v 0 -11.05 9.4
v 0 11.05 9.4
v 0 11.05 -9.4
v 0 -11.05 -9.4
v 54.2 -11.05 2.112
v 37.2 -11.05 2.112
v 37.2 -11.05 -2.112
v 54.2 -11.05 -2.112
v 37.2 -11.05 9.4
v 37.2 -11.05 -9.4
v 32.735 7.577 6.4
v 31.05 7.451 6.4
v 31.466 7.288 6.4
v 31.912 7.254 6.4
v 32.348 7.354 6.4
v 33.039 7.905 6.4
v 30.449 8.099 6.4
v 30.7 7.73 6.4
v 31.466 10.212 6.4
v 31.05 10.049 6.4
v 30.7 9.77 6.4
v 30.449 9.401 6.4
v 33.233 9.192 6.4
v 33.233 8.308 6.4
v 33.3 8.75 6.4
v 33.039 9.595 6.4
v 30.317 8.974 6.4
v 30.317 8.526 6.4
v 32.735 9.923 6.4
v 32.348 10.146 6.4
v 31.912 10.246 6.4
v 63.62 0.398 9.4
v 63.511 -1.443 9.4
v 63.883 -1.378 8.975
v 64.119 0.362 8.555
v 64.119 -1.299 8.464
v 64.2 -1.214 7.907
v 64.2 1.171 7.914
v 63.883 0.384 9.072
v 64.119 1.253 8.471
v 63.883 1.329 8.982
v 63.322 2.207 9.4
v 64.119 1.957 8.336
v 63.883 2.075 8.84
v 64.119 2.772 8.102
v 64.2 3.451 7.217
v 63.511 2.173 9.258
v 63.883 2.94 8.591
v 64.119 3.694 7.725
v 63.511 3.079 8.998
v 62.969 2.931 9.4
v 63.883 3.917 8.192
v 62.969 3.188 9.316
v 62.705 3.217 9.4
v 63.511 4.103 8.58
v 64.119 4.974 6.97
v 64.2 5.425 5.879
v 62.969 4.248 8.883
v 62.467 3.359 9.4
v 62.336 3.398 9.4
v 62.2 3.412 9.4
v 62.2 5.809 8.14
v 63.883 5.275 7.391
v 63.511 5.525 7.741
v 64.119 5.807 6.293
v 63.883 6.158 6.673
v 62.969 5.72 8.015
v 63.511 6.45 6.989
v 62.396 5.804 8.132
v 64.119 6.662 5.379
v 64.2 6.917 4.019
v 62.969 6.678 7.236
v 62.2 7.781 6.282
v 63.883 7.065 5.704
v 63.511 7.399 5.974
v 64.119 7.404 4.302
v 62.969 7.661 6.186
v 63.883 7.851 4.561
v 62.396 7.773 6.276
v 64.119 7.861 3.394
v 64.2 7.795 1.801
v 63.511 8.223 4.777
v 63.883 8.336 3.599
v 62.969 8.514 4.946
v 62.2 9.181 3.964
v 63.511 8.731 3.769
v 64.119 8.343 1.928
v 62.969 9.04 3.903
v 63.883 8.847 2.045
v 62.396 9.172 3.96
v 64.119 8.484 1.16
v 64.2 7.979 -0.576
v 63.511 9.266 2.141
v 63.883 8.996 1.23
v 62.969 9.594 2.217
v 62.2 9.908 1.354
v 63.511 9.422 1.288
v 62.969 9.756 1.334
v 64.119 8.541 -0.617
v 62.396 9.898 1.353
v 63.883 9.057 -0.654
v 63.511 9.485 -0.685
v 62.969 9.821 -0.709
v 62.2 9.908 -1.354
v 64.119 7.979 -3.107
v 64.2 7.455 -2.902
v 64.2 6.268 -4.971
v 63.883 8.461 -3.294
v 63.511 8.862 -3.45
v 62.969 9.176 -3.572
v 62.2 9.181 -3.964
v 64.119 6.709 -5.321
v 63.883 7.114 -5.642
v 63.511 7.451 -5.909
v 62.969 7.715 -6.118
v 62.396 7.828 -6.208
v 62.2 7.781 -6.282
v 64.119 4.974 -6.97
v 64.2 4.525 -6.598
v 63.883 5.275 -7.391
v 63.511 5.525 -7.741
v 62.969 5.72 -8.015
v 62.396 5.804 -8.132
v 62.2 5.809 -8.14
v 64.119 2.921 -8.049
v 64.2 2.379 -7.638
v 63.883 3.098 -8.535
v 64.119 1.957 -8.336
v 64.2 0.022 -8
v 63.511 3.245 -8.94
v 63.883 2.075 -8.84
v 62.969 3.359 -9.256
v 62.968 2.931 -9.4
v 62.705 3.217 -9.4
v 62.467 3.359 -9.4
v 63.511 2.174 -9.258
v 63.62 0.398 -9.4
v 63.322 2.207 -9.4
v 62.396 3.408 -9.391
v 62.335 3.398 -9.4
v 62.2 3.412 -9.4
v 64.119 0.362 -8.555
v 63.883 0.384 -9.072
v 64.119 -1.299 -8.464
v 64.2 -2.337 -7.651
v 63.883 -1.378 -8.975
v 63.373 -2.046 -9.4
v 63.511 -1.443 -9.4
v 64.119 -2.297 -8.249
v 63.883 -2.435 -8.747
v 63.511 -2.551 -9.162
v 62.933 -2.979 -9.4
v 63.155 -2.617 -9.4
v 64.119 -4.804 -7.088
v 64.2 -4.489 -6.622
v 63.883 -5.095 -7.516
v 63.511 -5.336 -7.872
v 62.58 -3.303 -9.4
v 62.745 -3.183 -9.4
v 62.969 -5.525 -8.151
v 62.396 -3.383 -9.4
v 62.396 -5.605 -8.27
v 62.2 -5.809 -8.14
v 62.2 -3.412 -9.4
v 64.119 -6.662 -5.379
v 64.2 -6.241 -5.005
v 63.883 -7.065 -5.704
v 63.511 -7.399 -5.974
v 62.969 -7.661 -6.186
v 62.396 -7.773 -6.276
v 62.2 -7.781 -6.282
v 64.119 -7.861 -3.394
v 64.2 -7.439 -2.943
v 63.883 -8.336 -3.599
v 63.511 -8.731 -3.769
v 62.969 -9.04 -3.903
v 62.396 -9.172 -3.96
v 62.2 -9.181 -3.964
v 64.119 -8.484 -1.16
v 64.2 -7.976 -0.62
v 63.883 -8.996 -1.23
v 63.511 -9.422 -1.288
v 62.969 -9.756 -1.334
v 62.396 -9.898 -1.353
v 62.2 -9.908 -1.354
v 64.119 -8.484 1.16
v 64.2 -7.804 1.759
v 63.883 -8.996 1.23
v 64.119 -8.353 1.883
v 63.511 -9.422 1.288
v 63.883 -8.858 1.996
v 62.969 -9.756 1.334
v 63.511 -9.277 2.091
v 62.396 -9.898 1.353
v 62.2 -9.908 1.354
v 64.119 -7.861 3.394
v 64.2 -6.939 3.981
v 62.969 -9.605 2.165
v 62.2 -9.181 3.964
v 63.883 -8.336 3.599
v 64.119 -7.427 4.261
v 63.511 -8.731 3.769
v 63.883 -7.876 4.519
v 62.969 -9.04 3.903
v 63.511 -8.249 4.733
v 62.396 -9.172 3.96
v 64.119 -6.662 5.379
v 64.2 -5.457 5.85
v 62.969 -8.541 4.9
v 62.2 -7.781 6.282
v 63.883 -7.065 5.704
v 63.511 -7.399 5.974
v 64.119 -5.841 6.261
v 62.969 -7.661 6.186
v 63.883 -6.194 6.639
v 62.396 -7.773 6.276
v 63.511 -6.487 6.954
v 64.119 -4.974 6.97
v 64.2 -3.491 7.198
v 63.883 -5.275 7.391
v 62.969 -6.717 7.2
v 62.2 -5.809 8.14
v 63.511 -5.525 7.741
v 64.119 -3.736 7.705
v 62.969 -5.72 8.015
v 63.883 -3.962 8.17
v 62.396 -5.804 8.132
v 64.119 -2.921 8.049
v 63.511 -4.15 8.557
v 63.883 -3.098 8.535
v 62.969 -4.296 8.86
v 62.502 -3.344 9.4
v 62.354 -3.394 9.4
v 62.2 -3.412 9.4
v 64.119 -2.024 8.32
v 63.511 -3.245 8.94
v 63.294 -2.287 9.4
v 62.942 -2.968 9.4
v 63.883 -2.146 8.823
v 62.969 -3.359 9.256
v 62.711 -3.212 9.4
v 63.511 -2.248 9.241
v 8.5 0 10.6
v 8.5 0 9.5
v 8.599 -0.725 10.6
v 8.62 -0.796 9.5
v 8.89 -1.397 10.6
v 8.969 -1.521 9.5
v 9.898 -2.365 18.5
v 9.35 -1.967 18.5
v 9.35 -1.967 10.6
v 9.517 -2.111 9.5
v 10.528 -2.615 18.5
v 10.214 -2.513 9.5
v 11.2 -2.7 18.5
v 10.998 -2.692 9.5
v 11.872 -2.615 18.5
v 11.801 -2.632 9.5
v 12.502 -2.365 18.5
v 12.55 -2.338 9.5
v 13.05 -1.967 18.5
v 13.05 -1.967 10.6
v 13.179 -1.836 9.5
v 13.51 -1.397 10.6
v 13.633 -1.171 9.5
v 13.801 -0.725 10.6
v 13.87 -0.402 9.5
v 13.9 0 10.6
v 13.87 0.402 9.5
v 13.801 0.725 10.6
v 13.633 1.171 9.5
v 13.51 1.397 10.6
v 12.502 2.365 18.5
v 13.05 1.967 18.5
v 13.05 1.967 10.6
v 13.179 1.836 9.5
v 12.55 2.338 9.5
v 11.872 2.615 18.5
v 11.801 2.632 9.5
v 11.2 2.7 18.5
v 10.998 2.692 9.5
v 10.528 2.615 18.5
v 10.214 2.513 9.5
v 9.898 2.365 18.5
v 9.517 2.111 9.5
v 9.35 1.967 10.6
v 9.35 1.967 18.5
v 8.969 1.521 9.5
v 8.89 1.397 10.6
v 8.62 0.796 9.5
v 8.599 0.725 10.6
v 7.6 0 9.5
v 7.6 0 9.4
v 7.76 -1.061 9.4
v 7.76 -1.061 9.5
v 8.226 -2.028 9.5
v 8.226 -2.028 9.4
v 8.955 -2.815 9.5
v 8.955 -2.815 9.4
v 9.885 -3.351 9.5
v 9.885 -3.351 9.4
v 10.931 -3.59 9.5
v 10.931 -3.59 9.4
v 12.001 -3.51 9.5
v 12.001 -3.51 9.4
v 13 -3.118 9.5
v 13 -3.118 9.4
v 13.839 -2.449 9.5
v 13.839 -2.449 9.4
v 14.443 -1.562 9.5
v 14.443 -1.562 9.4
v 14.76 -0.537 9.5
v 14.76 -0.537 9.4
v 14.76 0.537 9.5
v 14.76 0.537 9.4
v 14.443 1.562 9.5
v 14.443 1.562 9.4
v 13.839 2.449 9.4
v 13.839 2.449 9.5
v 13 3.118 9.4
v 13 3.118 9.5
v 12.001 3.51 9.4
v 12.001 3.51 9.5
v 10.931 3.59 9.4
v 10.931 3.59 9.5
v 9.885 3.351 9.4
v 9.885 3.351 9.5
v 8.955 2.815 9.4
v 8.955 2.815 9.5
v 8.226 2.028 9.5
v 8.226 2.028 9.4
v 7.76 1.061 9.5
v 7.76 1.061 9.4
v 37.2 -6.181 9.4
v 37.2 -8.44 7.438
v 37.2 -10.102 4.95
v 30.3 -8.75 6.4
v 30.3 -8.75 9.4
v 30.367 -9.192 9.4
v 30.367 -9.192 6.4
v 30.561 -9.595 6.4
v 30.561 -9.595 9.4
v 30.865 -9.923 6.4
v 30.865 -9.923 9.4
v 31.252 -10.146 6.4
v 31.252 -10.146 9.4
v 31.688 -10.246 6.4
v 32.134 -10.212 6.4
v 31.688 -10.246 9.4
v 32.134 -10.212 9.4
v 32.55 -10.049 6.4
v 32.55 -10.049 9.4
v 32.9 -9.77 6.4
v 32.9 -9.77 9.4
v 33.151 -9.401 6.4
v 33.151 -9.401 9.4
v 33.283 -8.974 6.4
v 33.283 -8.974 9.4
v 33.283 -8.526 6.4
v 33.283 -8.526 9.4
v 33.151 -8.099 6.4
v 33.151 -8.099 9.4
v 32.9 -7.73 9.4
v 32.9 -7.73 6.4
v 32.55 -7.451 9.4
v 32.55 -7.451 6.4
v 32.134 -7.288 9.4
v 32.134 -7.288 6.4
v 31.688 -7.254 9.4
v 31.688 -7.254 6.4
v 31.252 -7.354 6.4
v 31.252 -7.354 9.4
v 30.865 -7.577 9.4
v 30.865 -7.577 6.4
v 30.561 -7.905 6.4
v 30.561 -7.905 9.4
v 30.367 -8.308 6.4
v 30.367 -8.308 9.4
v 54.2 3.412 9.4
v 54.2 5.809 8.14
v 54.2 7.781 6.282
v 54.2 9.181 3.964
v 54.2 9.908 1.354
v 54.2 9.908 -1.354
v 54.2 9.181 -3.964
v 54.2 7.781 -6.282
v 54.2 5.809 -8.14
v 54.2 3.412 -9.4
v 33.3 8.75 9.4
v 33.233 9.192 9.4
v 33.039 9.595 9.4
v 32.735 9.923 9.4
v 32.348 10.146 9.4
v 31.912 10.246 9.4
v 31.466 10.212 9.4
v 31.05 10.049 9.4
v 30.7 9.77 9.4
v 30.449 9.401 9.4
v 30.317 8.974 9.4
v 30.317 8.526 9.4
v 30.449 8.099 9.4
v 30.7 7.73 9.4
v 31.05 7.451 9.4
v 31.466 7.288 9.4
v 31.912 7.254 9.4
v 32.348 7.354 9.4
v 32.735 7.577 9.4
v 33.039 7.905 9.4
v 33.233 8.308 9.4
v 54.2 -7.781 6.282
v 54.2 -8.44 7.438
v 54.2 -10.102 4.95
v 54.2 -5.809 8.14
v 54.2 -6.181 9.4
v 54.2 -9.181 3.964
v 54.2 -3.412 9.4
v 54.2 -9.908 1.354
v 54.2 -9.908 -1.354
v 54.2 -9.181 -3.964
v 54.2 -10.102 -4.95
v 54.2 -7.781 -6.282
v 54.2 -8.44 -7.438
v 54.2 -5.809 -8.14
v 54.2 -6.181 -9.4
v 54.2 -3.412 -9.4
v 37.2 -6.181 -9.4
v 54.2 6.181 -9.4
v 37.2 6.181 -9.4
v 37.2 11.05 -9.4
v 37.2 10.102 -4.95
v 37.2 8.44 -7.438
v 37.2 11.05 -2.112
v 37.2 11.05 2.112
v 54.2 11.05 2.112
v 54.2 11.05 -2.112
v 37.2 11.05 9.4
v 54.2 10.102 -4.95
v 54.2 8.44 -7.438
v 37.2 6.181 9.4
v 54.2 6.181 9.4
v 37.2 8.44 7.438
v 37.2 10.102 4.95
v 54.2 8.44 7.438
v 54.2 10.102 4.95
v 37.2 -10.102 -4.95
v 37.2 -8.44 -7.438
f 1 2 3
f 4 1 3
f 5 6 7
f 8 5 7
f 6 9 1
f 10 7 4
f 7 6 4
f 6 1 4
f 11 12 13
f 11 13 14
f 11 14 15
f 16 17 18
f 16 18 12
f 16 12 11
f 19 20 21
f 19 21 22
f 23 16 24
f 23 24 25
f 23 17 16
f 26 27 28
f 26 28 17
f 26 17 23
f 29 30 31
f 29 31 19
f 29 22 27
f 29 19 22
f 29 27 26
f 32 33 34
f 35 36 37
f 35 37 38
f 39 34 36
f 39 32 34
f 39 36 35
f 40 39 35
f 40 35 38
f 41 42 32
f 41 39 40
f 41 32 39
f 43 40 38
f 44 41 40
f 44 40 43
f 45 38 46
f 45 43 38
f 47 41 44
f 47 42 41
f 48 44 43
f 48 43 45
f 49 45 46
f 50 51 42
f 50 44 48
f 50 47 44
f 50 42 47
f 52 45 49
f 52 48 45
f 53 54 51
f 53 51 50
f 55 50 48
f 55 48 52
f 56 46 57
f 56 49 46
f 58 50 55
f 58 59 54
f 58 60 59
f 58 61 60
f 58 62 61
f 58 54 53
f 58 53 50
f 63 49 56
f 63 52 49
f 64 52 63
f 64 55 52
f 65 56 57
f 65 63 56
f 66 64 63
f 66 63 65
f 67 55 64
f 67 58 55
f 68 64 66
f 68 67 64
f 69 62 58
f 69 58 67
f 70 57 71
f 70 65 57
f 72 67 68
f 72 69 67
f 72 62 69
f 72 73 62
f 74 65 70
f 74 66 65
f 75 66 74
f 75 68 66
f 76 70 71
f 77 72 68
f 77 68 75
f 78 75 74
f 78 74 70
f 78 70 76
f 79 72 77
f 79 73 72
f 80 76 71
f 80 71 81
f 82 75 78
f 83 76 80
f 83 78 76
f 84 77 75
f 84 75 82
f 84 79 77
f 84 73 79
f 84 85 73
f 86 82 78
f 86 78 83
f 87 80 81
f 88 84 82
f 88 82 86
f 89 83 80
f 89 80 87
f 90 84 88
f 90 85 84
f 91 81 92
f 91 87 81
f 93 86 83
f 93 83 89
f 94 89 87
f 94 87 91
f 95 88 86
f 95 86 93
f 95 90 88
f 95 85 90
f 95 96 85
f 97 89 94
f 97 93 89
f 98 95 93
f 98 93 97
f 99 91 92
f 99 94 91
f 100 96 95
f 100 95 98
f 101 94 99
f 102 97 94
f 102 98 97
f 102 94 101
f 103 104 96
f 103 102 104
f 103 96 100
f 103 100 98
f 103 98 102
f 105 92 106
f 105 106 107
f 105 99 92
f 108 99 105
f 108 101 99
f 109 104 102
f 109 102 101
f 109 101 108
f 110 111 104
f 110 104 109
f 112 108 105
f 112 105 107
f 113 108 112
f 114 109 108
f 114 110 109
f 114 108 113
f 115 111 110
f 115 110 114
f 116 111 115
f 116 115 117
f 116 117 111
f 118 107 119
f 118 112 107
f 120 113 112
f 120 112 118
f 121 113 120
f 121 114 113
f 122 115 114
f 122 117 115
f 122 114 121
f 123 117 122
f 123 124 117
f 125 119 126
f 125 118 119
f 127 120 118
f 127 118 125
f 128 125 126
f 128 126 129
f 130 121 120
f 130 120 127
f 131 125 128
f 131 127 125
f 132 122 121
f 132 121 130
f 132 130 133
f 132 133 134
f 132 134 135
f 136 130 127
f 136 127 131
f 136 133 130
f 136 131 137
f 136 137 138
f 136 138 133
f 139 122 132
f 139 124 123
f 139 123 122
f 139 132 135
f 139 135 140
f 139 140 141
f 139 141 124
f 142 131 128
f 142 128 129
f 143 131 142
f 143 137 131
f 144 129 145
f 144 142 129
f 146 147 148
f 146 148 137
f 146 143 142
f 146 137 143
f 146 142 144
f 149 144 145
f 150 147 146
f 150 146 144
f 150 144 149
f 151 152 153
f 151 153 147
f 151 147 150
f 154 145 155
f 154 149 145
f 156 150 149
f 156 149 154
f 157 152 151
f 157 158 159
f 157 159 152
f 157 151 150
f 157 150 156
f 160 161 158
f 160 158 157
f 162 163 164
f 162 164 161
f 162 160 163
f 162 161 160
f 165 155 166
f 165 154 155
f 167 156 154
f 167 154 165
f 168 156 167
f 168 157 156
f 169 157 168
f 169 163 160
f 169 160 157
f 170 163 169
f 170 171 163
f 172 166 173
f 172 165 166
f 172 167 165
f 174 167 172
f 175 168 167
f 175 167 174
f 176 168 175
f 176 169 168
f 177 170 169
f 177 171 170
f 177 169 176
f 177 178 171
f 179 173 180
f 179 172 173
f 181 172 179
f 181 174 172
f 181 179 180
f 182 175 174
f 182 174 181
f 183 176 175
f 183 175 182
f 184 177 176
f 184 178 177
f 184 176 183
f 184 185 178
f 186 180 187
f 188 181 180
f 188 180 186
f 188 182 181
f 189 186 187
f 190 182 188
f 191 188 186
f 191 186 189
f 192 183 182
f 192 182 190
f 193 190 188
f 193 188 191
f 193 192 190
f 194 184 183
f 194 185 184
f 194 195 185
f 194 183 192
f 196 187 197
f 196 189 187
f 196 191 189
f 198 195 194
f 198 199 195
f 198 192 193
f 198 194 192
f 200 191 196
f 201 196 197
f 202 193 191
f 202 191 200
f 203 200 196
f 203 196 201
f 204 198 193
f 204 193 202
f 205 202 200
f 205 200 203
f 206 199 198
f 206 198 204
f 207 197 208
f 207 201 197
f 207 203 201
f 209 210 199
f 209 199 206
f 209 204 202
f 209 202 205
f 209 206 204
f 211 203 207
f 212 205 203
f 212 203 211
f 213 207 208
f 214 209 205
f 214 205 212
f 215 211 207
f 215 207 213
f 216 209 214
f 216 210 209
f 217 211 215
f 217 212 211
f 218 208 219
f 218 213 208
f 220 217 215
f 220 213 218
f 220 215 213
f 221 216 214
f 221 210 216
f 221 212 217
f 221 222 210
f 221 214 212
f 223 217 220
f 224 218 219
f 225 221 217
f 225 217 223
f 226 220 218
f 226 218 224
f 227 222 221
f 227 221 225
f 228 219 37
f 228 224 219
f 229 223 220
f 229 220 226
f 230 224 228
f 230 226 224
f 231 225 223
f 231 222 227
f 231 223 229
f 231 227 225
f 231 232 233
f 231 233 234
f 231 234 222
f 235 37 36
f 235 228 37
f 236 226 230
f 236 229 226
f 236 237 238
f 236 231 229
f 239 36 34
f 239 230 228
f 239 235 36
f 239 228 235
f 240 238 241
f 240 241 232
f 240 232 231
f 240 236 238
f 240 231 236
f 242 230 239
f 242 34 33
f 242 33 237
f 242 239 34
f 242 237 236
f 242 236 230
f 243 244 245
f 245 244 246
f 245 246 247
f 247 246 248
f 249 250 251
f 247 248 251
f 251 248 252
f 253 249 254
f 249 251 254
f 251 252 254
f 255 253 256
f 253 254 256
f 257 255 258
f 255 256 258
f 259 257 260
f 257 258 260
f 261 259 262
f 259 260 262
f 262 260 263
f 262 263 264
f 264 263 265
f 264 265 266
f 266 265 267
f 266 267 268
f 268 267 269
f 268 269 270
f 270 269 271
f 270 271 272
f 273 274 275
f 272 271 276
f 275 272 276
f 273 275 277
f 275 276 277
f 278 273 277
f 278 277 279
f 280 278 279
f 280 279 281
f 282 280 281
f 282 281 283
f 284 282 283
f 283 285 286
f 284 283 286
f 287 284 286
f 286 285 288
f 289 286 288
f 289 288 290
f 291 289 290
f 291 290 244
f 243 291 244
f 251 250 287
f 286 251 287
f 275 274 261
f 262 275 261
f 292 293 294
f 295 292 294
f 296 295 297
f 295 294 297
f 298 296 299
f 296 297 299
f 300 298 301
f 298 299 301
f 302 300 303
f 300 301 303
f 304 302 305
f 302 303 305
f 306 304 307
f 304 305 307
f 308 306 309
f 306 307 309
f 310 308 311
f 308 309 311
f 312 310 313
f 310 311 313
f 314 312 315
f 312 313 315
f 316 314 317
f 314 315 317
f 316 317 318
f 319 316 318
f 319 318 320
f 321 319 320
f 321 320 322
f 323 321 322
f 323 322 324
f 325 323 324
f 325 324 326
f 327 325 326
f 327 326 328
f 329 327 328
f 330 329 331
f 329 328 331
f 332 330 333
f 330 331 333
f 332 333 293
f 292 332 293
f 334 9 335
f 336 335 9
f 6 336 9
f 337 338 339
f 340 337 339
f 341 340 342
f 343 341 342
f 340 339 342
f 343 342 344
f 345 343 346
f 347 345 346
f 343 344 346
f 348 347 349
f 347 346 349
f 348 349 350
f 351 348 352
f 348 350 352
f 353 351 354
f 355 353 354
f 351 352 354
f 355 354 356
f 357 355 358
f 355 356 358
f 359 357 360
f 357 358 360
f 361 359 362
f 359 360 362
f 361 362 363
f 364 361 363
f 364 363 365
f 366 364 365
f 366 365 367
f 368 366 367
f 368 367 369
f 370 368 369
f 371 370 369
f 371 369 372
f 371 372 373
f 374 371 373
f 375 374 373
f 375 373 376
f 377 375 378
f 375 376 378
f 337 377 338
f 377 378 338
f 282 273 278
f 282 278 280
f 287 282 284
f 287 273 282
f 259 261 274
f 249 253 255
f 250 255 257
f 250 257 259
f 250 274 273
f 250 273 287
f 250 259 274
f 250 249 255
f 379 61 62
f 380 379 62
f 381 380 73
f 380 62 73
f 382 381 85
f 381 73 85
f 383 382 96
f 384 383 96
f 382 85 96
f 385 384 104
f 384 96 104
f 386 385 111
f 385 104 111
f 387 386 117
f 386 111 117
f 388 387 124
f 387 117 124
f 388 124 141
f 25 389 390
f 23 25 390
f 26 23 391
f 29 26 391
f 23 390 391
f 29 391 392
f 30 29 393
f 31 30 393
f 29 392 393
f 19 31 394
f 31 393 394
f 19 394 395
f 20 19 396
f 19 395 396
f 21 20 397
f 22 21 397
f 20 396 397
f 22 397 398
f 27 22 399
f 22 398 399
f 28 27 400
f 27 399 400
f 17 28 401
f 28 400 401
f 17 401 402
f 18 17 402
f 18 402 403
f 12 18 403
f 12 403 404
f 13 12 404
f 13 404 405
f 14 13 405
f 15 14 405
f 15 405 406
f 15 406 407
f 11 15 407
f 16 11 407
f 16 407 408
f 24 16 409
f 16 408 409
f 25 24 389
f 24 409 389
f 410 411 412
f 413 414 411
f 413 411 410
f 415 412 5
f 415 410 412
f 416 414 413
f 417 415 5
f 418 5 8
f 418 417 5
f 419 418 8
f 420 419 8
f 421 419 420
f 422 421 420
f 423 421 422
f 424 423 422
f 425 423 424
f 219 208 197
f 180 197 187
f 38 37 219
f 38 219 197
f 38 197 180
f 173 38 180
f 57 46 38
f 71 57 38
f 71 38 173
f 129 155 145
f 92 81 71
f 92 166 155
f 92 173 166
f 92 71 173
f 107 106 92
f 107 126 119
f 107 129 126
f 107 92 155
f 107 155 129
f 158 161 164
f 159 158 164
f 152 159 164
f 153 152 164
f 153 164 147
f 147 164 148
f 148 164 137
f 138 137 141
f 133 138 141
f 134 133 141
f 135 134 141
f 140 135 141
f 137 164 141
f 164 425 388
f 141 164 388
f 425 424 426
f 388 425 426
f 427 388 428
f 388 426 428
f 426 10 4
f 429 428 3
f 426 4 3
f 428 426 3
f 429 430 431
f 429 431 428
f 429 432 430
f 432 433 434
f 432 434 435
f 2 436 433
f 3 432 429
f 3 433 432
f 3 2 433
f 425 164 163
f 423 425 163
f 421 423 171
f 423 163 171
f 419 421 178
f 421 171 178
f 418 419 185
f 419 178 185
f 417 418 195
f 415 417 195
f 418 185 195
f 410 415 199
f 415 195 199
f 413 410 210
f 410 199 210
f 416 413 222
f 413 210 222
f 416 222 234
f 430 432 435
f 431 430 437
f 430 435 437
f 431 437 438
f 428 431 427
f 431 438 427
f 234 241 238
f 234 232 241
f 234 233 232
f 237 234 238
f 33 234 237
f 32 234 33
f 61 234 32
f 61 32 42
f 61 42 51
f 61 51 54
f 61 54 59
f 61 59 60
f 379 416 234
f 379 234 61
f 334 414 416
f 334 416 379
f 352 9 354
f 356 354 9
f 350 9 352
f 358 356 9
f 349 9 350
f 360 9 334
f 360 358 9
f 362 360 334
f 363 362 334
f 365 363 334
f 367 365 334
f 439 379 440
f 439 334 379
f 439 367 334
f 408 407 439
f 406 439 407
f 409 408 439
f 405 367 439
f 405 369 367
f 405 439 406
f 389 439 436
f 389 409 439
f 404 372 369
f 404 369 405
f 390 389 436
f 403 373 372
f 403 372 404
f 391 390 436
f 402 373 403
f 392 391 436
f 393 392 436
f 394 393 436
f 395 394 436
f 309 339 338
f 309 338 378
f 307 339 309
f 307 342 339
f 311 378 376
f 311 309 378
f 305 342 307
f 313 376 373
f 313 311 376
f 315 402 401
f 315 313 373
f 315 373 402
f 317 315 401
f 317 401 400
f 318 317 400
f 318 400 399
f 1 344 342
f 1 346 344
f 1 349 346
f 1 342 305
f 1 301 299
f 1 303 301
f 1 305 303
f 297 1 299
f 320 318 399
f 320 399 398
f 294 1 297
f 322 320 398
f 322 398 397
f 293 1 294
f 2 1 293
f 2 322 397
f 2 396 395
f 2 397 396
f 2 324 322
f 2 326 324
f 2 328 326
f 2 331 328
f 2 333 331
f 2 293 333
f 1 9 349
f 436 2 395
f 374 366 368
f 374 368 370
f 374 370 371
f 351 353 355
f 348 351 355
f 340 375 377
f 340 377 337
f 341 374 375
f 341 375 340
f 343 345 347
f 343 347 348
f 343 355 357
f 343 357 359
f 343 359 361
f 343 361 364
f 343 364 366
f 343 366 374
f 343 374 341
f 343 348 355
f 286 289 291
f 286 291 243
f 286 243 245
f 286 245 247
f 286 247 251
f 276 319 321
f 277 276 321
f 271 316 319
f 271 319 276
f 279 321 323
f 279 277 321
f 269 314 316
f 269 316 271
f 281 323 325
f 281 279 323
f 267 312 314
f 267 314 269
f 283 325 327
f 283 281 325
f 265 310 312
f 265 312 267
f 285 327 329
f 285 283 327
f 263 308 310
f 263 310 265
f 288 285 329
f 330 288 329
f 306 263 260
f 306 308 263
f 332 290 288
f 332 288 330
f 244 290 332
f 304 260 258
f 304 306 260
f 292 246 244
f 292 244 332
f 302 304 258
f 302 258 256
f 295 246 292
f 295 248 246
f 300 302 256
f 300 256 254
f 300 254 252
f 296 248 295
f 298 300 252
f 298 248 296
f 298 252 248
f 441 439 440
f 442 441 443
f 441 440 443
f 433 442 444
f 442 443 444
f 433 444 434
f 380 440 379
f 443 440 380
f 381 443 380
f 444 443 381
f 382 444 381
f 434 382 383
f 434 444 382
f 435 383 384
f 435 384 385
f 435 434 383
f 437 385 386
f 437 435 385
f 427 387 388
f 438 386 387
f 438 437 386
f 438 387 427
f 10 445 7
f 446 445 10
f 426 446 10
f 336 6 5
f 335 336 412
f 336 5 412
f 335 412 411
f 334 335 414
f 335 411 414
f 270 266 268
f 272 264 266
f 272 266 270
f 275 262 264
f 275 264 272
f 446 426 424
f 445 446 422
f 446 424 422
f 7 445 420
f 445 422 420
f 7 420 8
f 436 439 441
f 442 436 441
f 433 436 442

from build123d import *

# Parameters (mm, degrees)
SKETCH_2_W          = 18.8
SKETCH_2_H          = 22.1
EXTRUDE_1_DEPTH     = 64.2
SKETCH_4_R          = 3.6
EXTRUDE_2_DEPTH     = 0.1
SKETCH_5_R          = 2.7
EXTRUDE_3_DEPTH     = 9.1
CUT_EXTRUDE_START   = -7.9
CUT_EXTRUDE_1_DEPTH = 7.9
CUT_EXTRUDE_2_DEPTH = 27
CUT_EXTRUDE_3_DEPTH = 10
FILLET_1_R          = 2
SKETCH_10_R         = 1.5
CUT_EXTRUDE_4_DEPTH = 3


with BuildPart() as part:
    # 草图2 → 凸台-拉伸1 (new body)
    with BuildSketch(Plane(origin=(0, 0, 0), x_dir=(0, 0, -1), z_dir=(1, 0, 0))):
        Rectangle(SKETCH_2_W, SKETCH_2_H)
    extrude(amount=EXTRUDE_1_DEPTH)

    # 草图4 → 凸台-拉伸2 (add)
    with BuildSketch(Plane.XY.offset(9.4)):
        with Locations(Location((11.2, 0, 0), (0, 0, 180))):
            Circle(SKETCH_4_R)
    extrude(amount=EXTRUDE_2_DEPTH)

    # 草图5 → 凸台-拉伸3 (add)
    with BuildSketch(Plane.XY.offset(9.4)):
        with Locations(Location((11.2, 0, 0), (0, 0, 180))):
            Circle(SKETCH_5_R)
    extrude(amount=EXTRUDE_3_DEPTH)

    # 草图6 → 切除-拉伸1 (cut)
    with BuildSketch(Plane.XY.offset(18.5).offset(CUT_EXTRUDE_START)):
        with BuildLine():
            Line((9.35, -1.966596044), (9.35, 1.966596044))
            ThreePointArc((9.35, 1.966596044), (8.5, 0), (9.35, -1.966596044))
        make_face()
        with BuildLine():
            ThreePointArc((13.9, 0), (13.678406746, 1.071214264), (13.05, 1.966596044))
            Line((13.05, 1.966596044), (13.05, -1.966596044))
            ThreePointArc((13.05, -1.966596044), (13.678406746, -1.071214264), (13.9, 0))
        make_face()
    extrude(amount=CUT_EXTRUDE_1_DEPTH, mode=Mode.SUBTRACT)

    # 草图7 → 切除-拉伸2 (cut)
    with BuildSketch(Plane(origin=(64.2, 0, 0), x_dir=(0, 0, -1), z_dir=(1, 0, 0))):
        with BuildLine():
            ThreePointArc((-9.4, 6.180817098), (-6.249642407, 9.354382384), (-2.111871208, 11.05))
            Line((-2.111871208, 11.05), (-9.4, 11.05))
            Line((-9.4, 11.05), (-9.4, 6.180817098))
        make_face()
        with BuildLine():
            ThreePointArc((2.111871208, 11.05), (6.249642407, 9.354382384), (9.4, 6.180817098))
            Line((9.4, 6.180817098), (9.4, 11.05))
            Line((9.4, 11.05), (2.111871208, 11.05))
        make_face()
        with BuildLine():
            Line((2.111871208, -11.05), (9.4, -11.05))
            Line((9.4, -11.05), (9.4, -6.180817098))
            ThreePointArc((9.4, -6.180817098), (6.249642407, -9.354382384), (2.111871208, -11.05))
        make_face()
        with BuildLine():
            Line((-9.4, -11.05), (-2.111871208, -11.05))
            ThreePointArc((-2.111871208, -11.05), (-6.249642407, -9.354382384), (-9.4, -6.180817098))
            Line((-9.4, -6.180817098), (-9.4, -11.05))
        make_face()
    extrude(amount=-CUT_EXTRUDE_2_DEPTH, mode=Mode.SUBTRACT)

    # 草图9 → 切除-拉伸3 (cut)
    with BuildSketch(Plane(origin=(64.2, 0, 0), x_dir=(0, 0, -1), z_dir=(1, 0, 0))):
        with BuildLine():
            Line((-9.4, 6.180817098), (-9.4, 3.411744422))
            ThreePointArc((-9.4, 3.411744422), (0, 10), (9.4, 3.411744422))
            Line((9.4, 3.411744422), (9.4, 6.180817098))
            ThreePointArc((9.4, 6.180817098), (6.249642407, 9.354382384), (2.111871208, 11.05))
            Line((2.111871208, 11.05), (-2.111871208, 11.05))
            ThreePointArc((-2.111871208, 11.05), (-6.249642407, 9.354382384), (-9.4, 6.180817098))
        make_face()
        with BuildLine():
            ThreePointArc((-9.4, -6.180817098), (-6.249642407, -9.354382384), (-2.111871208, -11.05))
            Line((-2.111871208, -11.05), (2.111871208, -11.05))
            ThreePointArc((2.111871208, -11.05), (6.249642407, -9.354382384), (9.4, -6.180817098))
            Line((9.4, -6.180817098), (9.4, -3.411744422))
            ThreePointArc((9.4, -3.411744422), (0, -10), (-9.4, -3.411744422))
            Line((-9.4, -3.411744422), (-9.4, -6.180817098))
        make_face()
    extrude(amount=-CUT_EXTRUDE_3_DEPTH, mode=Mode.SUBTRACT)

    # 圆角1
    # the kernel refuses this fillet: 2 mm, written as the material it takes off along each edge
    with BuildSketch(Plane(origin=(64.2, 0, 0), x_dir=(0, -0.15173257370011314, 0.9884215831710372), z_dir=(0, -0.9884215831710372, -0.15173257370011314))) as fillet_1_piece_1:
        with BuildLine():
            CenterArc((10 - FILLET_1_R, FILLET_1_R), FILLET_1_R, 270, 90)
            Line((10 - FILLET_1_R, 0), (10, 0))
            Line((10, 0), (10, FILLET_1_R))
        make_face()
    revolve(axis=Axis((64.2, 0, 0), (-1, 0, 0)), revolution_arc=197.454690212, mode=Mode.SUBTRACT)
    with BuildSketch(Plane(origin=(64.2, 0, 0), x_dir=(0, 0.1517325737001477, -0.9884215831710319), z_dir=(0, 0.9884215831710319, 0.1517325737001477))) as fillet_1_piece_2:
        with BuildLine():
            CenterArc((10 - FILLET_1_R, FILLET_1_R), FILLET_1_R, 270, 90)
            Line((10, FILLET_1_R), (10, 0))
            Line((10, 0), (10 - FILLET_1_R, 0))
        make_face()
    revolve(axis=Axis((64.2, 0, 0), (-1, 0, 0)), revolution_arc=197.454690212, mode=Mode.SUBTRACT)

    # 草图10 → 切除-拉伸4 (cut)
    with BuildSketch(Plane.XY.offset(9.4)):
        with Locations((31.8, 8.75)):
            Circle(SKETCH_10_R)
        with Locations(Location((31.8, -8.75, 0), (0, 0, 180))):
            Circle(SKETCH_10_R)
    extrude(amount=-CUT_EXTRUDE_4_DEPTH, mode=Mode.SUBTRACT)


solid = part.part
